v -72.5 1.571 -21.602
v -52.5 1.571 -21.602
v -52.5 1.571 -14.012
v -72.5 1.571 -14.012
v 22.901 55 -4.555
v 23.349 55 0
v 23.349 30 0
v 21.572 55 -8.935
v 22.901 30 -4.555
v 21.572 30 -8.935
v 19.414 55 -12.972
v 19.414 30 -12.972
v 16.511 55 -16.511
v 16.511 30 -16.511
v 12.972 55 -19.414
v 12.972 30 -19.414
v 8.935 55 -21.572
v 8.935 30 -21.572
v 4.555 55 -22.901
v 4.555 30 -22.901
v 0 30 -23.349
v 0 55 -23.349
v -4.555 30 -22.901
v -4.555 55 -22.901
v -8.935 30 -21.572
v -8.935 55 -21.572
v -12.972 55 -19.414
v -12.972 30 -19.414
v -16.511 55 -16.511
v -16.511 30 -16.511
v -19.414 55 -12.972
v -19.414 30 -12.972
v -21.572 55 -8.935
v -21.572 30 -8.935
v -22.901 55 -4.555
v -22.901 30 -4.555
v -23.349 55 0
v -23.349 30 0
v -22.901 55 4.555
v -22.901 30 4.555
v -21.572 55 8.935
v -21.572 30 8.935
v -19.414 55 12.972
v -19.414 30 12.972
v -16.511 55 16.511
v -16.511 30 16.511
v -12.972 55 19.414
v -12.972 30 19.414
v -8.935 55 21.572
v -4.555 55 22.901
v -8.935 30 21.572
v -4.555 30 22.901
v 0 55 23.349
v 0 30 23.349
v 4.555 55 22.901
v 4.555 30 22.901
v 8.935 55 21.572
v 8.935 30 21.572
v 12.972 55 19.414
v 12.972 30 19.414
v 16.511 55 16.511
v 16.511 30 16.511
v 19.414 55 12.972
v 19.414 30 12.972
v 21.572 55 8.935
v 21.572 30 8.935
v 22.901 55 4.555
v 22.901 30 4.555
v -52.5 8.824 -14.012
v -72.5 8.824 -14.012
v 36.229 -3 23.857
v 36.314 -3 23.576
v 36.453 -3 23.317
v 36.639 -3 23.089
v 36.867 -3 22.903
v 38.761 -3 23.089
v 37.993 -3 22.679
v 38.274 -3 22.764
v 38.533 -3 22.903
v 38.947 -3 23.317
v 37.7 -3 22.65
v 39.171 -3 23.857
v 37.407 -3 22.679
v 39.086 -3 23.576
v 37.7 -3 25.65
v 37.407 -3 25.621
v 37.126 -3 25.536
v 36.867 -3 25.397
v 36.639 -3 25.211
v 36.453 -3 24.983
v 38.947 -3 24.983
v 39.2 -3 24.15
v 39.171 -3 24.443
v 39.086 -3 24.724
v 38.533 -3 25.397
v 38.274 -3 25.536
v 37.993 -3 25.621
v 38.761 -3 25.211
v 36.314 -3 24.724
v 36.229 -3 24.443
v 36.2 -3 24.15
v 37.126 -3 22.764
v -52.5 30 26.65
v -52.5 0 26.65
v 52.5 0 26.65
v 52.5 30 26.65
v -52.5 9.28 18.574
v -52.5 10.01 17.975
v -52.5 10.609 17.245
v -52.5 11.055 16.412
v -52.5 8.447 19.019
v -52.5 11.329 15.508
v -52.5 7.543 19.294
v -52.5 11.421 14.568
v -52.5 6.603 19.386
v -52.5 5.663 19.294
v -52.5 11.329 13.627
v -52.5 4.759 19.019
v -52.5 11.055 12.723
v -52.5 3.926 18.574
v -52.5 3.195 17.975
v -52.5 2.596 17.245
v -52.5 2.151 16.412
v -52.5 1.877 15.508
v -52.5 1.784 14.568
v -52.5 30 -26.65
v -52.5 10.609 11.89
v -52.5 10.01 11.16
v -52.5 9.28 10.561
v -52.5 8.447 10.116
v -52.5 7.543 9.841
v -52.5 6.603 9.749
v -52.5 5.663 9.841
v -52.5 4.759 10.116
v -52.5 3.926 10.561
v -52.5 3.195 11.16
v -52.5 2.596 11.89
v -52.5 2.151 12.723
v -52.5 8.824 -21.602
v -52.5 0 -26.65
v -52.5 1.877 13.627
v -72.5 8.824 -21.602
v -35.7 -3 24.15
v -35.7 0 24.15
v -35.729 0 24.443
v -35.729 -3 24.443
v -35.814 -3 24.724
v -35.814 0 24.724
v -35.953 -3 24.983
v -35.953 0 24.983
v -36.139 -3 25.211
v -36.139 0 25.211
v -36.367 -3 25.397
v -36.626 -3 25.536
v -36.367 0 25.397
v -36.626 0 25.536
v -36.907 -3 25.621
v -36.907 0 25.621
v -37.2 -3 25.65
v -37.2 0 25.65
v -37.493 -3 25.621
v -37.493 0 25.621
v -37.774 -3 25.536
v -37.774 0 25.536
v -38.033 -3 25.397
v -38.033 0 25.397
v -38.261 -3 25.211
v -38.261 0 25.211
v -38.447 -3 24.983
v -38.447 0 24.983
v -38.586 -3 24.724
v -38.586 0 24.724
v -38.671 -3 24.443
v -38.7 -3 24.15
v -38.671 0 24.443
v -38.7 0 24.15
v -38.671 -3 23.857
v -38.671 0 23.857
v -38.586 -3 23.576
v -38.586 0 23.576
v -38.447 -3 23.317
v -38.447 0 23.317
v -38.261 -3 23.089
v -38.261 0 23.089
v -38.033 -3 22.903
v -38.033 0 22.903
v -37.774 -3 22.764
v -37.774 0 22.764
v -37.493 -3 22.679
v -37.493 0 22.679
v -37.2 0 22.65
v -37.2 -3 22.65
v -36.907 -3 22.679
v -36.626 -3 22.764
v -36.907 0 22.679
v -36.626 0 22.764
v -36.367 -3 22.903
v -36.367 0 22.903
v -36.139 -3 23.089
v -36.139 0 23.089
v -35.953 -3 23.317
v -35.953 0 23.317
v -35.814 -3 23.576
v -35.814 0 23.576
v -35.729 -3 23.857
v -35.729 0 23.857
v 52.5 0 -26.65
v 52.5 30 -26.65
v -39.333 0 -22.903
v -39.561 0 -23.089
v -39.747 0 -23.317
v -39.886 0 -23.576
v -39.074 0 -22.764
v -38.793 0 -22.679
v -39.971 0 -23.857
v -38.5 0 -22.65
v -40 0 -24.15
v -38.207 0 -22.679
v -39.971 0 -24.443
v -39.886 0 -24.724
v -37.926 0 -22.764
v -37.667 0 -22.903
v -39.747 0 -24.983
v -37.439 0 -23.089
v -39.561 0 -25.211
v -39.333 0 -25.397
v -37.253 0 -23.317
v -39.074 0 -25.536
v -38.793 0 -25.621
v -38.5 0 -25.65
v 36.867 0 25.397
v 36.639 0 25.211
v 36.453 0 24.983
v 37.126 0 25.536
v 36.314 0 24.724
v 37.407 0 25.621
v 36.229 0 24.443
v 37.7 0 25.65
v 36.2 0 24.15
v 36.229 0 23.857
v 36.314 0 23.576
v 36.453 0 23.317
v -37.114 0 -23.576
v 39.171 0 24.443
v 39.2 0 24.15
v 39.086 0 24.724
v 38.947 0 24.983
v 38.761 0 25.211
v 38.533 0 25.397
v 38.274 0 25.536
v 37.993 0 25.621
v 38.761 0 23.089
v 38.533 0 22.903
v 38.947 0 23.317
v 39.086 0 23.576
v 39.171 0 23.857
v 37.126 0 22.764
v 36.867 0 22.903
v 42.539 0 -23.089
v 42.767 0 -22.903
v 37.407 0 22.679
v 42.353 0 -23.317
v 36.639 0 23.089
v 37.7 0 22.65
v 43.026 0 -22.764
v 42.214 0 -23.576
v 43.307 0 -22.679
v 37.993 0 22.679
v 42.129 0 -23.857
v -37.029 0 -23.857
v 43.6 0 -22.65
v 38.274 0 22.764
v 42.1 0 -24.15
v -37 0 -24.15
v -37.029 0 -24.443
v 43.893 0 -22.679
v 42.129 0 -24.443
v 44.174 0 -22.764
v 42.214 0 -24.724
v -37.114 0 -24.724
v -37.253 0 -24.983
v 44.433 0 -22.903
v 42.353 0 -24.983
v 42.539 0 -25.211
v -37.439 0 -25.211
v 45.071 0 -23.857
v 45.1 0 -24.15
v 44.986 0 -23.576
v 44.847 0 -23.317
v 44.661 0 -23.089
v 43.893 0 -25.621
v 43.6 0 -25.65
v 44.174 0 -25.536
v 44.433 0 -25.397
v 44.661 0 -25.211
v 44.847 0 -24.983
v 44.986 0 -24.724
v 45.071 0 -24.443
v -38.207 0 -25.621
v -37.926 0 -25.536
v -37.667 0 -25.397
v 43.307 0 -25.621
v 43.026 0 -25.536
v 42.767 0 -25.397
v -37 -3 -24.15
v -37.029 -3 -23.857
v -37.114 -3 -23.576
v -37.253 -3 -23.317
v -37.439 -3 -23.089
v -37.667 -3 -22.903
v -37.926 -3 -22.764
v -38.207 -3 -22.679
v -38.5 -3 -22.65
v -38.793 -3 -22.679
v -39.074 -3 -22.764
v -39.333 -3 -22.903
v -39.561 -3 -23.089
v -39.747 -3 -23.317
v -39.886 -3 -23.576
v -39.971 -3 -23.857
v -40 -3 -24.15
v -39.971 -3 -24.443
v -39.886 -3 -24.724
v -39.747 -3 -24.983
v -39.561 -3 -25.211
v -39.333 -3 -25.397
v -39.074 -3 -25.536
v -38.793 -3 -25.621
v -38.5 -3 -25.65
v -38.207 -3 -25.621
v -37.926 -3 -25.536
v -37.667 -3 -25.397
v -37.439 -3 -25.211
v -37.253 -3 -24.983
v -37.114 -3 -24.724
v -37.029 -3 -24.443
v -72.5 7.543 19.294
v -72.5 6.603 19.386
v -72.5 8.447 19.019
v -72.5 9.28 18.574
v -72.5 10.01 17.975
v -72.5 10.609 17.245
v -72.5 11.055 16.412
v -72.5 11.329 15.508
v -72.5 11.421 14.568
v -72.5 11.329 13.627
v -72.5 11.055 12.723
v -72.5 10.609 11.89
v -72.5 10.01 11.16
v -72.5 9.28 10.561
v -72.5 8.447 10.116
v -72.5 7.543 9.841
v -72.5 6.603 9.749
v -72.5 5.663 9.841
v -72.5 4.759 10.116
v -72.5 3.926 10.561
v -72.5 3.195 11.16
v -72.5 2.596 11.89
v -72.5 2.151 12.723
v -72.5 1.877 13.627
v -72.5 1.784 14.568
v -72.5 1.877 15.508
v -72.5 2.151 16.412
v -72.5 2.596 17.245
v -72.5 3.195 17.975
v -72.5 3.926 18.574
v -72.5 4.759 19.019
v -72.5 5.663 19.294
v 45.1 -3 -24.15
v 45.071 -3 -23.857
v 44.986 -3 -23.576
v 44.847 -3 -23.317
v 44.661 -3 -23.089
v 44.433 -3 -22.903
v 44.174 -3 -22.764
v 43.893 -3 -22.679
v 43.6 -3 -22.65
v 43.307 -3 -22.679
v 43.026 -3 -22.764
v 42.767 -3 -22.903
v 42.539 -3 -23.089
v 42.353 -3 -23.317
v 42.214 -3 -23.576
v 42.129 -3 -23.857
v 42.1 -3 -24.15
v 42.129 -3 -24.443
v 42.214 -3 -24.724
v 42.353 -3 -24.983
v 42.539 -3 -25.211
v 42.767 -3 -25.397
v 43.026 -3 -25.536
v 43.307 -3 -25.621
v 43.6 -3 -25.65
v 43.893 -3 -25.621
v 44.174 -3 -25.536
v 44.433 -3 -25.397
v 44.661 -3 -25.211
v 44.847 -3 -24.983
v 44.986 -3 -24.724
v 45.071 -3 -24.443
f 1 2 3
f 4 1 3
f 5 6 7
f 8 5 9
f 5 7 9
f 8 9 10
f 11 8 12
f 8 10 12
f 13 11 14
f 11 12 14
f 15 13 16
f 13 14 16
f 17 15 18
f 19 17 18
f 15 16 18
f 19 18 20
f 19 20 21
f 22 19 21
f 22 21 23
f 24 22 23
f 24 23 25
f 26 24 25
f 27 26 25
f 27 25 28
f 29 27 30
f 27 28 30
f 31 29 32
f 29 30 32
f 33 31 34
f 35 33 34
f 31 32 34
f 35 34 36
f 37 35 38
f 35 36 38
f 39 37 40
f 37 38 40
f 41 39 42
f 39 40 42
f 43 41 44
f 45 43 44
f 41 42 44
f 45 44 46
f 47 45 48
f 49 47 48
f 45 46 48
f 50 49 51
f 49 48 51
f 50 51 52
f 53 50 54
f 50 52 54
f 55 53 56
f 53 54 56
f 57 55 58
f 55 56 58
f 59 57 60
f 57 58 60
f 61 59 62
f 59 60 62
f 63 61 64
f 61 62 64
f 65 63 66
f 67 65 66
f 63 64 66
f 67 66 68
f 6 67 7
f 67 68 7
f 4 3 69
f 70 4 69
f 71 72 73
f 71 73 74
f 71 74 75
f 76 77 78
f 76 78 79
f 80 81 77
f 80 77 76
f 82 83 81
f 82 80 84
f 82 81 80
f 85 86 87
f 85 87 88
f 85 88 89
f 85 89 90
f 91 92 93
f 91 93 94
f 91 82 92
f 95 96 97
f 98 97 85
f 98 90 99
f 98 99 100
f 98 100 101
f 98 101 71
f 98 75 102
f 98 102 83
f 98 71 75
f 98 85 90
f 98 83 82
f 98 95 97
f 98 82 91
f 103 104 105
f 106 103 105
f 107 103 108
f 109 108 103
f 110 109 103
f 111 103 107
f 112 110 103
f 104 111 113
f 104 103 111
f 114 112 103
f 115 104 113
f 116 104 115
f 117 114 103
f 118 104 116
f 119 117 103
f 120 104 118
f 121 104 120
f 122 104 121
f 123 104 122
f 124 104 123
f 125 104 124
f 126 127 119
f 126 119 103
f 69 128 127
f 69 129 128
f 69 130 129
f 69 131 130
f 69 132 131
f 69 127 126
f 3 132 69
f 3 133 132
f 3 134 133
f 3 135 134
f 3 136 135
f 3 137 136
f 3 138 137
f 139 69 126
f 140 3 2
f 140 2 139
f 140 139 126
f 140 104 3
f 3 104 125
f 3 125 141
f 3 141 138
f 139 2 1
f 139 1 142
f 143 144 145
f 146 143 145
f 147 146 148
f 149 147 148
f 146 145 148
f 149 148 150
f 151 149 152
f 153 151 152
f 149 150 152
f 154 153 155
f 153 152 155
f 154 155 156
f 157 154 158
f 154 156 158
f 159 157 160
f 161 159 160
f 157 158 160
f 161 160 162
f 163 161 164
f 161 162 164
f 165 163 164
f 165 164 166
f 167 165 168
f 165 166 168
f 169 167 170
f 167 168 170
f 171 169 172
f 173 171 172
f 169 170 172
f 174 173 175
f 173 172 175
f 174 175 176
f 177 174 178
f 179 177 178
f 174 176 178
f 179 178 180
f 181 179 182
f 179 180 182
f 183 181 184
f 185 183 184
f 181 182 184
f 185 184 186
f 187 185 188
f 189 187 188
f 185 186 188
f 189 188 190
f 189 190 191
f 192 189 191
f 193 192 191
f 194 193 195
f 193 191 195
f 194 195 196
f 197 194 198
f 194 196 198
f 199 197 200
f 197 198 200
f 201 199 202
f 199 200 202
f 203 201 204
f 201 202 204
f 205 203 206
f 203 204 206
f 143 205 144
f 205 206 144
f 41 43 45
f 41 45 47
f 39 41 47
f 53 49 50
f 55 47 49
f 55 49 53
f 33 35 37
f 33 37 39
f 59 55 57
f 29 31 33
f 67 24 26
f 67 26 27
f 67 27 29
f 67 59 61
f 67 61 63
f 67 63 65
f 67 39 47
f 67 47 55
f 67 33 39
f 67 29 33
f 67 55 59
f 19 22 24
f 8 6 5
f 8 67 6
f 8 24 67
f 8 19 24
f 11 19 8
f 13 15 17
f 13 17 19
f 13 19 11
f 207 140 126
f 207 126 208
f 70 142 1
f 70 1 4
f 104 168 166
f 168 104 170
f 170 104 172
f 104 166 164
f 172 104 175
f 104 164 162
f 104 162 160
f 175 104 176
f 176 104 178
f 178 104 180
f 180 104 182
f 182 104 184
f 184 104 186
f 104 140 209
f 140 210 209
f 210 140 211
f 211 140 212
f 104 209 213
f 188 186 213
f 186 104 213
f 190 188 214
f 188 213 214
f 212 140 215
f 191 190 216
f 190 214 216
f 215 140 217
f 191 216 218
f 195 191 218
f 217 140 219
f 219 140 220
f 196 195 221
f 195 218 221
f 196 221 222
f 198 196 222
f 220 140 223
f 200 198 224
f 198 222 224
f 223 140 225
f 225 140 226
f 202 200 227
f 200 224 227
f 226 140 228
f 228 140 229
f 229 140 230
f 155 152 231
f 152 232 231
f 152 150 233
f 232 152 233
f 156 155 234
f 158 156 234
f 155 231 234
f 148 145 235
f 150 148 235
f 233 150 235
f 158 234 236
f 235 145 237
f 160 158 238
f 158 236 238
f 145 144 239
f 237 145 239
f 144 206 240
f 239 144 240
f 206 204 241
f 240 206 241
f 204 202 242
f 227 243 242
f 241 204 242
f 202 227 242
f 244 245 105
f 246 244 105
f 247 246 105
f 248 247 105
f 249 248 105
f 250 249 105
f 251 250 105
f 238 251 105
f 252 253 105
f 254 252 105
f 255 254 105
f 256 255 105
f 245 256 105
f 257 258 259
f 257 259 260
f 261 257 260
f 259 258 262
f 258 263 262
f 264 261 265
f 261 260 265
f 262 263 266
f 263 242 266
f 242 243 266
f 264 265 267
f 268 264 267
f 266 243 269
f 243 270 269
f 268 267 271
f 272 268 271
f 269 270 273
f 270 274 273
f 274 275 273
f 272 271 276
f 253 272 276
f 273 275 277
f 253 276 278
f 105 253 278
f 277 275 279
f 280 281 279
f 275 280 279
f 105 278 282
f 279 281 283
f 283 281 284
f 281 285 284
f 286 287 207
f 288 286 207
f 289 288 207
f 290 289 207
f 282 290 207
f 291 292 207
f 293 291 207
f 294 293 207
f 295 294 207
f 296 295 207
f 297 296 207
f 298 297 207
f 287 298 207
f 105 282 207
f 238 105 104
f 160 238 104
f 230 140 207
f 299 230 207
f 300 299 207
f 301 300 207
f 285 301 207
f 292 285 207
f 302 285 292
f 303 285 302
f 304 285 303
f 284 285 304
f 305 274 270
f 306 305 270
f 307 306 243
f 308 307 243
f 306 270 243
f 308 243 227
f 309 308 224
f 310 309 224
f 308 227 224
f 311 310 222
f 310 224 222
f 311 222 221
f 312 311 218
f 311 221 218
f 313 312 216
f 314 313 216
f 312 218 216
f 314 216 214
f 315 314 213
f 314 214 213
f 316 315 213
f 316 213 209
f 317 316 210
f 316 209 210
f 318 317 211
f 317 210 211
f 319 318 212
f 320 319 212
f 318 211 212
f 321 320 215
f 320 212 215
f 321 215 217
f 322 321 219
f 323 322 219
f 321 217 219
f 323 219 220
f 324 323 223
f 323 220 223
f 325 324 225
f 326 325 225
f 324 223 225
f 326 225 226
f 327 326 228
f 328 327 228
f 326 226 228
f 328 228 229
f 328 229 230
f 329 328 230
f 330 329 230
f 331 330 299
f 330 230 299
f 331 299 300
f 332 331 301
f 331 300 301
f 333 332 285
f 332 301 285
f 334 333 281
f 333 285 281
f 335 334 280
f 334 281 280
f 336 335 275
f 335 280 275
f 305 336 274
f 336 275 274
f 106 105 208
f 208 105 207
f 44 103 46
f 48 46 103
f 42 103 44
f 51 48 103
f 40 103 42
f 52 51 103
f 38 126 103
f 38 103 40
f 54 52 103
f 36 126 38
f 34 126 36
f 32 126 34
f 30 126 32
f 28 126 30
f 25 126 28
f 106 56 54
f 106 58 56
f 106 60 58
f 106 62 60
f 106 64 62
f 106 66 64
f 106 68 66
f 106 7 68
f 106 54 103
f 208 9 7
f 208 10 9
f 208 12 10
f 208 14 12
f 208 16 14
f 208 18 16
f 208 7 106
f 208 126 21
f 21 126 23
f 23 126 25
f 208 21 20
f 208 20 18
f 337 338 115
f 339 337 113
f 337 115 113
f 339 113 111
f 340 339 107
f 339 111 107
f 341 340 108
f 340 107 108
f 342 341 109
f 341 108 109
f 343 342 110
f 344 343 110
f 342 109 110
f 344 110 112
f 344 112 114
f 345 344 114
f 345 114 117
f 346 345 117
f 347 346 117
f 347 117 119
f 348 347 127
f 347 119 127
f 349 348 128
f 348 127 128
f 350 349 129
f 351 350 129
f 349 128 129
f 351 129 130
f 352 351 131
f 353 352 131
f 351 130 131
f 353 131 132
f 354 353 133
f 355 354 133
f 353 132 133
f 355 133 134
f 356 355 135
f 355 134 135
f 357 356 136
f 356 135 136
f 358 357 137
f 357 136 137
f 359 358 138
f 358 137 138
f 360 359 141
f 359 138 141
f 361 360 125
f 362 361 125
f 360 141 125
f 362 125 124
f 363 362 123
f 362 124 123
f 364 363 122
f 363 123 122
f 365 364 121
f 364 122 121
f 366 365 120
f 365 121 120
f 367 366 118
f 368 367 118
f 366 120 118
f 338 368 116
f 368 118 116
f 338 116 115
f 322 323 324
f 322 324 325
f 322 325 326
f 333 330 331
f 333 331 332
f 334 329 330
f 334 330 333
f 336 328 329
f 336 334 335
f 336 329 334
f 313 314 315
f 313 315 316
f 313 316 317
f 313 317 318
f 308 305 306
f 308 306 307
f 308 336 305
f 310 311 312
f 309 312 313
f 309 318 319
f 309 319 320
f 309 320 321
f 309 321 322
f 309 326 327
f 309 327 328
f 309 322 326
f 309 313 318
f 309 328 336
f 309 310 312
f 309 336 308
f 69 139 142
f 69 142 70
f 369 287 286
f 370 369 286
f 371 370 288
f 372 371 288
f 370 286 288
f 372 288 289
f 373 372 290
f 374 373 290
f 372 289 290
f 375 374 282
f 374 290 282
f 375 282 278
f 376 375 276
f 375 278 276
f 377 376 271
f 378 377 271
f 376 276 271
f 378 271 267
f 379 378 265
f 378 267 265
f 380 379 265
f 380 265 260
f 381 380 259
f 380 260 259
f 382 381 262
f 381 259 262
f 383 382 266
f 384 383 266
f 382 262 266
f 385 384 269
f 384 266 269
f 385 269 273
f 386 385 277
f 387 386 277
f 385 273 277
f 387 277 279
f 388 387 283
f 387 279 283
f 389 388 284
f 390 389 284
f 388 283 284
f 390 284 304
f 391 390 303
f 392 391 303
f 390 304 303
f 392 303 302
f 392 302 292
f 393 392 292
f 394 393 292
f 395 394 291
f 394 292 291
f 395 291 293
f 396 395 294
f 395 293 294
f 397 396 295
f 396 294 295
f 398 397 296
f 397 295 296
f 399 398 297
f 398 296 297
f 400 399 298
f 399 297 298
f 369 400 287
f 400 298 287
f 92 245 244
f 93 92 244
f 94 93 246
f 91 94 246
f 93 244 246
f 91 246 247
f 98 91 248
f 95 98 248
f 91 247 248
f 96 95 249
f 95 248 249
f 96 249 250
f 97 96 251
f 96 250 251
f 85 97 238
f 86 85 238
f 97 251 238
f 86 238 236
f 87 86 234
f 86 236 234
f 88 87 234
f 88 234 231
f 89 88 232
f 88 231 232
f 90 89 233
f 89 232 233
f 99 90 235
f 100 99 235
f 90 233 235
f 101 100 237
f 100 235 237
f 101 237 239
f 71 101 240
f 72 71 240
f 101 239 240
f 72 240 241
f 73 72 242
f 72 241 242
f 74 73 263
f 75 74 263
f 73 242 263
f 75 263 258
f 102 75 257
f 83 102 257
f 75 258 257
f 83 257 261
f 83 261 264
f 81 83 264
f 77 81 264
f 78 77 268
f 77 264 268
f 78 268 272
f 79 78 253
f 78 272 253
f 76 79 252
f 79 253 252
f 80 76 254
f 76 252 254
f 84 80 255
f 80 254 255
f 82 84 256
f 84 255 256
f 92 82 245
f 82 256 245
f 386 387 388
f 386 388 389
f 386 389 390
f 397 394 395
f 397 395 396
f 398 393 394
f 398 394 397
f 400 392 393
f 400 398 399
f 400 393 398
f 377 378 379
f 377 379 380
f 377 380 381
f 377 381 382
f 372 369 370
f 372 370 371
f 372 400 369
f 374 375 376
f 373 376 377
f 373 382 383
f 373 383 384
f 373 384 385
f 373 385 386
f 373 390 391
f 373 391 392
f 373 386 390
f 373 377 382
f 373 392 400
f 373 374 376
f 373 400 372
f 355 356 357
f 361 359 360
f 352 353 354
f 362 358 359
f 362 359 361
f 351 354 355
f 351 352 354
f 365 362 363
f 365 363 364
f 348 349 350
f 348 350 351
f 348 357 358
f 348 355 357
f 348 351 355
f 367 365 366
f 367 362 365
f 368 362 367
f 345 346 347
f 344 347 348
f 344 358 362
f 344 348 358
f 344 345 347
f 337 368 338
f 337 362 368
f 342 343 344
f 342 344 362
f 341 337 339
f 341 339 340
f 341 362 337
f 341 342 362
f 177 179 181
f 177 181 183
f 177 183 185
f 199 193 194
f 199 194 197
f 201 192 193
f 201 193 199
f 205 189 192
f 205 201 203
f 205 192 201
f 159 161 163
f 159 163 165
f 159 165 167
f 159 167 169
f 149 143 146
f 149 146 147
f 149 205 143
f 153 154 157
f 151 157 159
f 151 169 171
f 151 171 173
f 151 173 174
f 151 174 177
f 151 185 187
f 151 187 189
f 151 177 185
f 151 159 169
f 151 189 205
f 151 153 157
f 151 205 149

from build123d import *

# Parameters (mm, degrees)
SKETCH1_W           = 105
SKETCH1_H           = 53.3
BOSS_EXTRUDE1_DEPTH = 30
SKETCH2_R           = 4.818720667
SKETCH2_W           = 7.589906064
SKETCH2_H           = 7.253051844
BOSS_EXTRUDE2_DEPTH = 20
SKETCH3_R           = 23.34946898
BOSS_EXTRUDE3_DEPTH = 25
SKETCH4_R           = 1.5
BOSS_EXTRUDE4_DEPTH = 3


with BuildPart() as part:
    # Sketch1 → Boss-Extrude1 (new body)
    with BuildSketch(Plane(origin=(0, 0, 0), x_dir=(1, 0, 0), z_dir=(0, 1, 0))):
        Rectangle(SKETCH1_W, SKETCH1_H)
    extrude(amount=BOSS_EXTRUDE1_DEPTH)

    # Sketch2 → Boss-Extrude2 (add)
    with BuildSketch(Plane.ZY.offset(52.5)):
        with Locations((14.56750928, 6.602710937)):
            Circle(SKETCH2_R)
        with Locations((-17.806950585, 5.197359545)):
            Rectangle(SKETCH2_W, SKETCH2_H)
    extrude(amount=BOSS_EXTRUDE2_DEPTH)

    # Sketch3 → Boss-Extrude3 (add)
    with BuildSketch(Plane(origin=(0, 30, 0), x_dir=(1, 0, 0), z_dir=(0, 1, 0))):
        Circle(SKETCH3_R)
    extrude(amount=BOSS_EXTRUDE3_DEPTH)

    # Sketch4 → Boss-Extrude4 (add)
    with BuildSketch(Plane.XZ):
        with Locations((-37.2, 24.15)):
            Circle(SKETCH4_R)
        with Locations((-38.5, -24.15)):
            Circle(SKETCH4_R)
        with Locations((37.7, 24.15)):
            Circle(SKETCH4_R)
        with Locations((43.6, -24.15)):
            Circle(SKETCH4_R)
    extrude(amount=BOSS_EXTRUDE4_DEPTH)


solid = part.part
